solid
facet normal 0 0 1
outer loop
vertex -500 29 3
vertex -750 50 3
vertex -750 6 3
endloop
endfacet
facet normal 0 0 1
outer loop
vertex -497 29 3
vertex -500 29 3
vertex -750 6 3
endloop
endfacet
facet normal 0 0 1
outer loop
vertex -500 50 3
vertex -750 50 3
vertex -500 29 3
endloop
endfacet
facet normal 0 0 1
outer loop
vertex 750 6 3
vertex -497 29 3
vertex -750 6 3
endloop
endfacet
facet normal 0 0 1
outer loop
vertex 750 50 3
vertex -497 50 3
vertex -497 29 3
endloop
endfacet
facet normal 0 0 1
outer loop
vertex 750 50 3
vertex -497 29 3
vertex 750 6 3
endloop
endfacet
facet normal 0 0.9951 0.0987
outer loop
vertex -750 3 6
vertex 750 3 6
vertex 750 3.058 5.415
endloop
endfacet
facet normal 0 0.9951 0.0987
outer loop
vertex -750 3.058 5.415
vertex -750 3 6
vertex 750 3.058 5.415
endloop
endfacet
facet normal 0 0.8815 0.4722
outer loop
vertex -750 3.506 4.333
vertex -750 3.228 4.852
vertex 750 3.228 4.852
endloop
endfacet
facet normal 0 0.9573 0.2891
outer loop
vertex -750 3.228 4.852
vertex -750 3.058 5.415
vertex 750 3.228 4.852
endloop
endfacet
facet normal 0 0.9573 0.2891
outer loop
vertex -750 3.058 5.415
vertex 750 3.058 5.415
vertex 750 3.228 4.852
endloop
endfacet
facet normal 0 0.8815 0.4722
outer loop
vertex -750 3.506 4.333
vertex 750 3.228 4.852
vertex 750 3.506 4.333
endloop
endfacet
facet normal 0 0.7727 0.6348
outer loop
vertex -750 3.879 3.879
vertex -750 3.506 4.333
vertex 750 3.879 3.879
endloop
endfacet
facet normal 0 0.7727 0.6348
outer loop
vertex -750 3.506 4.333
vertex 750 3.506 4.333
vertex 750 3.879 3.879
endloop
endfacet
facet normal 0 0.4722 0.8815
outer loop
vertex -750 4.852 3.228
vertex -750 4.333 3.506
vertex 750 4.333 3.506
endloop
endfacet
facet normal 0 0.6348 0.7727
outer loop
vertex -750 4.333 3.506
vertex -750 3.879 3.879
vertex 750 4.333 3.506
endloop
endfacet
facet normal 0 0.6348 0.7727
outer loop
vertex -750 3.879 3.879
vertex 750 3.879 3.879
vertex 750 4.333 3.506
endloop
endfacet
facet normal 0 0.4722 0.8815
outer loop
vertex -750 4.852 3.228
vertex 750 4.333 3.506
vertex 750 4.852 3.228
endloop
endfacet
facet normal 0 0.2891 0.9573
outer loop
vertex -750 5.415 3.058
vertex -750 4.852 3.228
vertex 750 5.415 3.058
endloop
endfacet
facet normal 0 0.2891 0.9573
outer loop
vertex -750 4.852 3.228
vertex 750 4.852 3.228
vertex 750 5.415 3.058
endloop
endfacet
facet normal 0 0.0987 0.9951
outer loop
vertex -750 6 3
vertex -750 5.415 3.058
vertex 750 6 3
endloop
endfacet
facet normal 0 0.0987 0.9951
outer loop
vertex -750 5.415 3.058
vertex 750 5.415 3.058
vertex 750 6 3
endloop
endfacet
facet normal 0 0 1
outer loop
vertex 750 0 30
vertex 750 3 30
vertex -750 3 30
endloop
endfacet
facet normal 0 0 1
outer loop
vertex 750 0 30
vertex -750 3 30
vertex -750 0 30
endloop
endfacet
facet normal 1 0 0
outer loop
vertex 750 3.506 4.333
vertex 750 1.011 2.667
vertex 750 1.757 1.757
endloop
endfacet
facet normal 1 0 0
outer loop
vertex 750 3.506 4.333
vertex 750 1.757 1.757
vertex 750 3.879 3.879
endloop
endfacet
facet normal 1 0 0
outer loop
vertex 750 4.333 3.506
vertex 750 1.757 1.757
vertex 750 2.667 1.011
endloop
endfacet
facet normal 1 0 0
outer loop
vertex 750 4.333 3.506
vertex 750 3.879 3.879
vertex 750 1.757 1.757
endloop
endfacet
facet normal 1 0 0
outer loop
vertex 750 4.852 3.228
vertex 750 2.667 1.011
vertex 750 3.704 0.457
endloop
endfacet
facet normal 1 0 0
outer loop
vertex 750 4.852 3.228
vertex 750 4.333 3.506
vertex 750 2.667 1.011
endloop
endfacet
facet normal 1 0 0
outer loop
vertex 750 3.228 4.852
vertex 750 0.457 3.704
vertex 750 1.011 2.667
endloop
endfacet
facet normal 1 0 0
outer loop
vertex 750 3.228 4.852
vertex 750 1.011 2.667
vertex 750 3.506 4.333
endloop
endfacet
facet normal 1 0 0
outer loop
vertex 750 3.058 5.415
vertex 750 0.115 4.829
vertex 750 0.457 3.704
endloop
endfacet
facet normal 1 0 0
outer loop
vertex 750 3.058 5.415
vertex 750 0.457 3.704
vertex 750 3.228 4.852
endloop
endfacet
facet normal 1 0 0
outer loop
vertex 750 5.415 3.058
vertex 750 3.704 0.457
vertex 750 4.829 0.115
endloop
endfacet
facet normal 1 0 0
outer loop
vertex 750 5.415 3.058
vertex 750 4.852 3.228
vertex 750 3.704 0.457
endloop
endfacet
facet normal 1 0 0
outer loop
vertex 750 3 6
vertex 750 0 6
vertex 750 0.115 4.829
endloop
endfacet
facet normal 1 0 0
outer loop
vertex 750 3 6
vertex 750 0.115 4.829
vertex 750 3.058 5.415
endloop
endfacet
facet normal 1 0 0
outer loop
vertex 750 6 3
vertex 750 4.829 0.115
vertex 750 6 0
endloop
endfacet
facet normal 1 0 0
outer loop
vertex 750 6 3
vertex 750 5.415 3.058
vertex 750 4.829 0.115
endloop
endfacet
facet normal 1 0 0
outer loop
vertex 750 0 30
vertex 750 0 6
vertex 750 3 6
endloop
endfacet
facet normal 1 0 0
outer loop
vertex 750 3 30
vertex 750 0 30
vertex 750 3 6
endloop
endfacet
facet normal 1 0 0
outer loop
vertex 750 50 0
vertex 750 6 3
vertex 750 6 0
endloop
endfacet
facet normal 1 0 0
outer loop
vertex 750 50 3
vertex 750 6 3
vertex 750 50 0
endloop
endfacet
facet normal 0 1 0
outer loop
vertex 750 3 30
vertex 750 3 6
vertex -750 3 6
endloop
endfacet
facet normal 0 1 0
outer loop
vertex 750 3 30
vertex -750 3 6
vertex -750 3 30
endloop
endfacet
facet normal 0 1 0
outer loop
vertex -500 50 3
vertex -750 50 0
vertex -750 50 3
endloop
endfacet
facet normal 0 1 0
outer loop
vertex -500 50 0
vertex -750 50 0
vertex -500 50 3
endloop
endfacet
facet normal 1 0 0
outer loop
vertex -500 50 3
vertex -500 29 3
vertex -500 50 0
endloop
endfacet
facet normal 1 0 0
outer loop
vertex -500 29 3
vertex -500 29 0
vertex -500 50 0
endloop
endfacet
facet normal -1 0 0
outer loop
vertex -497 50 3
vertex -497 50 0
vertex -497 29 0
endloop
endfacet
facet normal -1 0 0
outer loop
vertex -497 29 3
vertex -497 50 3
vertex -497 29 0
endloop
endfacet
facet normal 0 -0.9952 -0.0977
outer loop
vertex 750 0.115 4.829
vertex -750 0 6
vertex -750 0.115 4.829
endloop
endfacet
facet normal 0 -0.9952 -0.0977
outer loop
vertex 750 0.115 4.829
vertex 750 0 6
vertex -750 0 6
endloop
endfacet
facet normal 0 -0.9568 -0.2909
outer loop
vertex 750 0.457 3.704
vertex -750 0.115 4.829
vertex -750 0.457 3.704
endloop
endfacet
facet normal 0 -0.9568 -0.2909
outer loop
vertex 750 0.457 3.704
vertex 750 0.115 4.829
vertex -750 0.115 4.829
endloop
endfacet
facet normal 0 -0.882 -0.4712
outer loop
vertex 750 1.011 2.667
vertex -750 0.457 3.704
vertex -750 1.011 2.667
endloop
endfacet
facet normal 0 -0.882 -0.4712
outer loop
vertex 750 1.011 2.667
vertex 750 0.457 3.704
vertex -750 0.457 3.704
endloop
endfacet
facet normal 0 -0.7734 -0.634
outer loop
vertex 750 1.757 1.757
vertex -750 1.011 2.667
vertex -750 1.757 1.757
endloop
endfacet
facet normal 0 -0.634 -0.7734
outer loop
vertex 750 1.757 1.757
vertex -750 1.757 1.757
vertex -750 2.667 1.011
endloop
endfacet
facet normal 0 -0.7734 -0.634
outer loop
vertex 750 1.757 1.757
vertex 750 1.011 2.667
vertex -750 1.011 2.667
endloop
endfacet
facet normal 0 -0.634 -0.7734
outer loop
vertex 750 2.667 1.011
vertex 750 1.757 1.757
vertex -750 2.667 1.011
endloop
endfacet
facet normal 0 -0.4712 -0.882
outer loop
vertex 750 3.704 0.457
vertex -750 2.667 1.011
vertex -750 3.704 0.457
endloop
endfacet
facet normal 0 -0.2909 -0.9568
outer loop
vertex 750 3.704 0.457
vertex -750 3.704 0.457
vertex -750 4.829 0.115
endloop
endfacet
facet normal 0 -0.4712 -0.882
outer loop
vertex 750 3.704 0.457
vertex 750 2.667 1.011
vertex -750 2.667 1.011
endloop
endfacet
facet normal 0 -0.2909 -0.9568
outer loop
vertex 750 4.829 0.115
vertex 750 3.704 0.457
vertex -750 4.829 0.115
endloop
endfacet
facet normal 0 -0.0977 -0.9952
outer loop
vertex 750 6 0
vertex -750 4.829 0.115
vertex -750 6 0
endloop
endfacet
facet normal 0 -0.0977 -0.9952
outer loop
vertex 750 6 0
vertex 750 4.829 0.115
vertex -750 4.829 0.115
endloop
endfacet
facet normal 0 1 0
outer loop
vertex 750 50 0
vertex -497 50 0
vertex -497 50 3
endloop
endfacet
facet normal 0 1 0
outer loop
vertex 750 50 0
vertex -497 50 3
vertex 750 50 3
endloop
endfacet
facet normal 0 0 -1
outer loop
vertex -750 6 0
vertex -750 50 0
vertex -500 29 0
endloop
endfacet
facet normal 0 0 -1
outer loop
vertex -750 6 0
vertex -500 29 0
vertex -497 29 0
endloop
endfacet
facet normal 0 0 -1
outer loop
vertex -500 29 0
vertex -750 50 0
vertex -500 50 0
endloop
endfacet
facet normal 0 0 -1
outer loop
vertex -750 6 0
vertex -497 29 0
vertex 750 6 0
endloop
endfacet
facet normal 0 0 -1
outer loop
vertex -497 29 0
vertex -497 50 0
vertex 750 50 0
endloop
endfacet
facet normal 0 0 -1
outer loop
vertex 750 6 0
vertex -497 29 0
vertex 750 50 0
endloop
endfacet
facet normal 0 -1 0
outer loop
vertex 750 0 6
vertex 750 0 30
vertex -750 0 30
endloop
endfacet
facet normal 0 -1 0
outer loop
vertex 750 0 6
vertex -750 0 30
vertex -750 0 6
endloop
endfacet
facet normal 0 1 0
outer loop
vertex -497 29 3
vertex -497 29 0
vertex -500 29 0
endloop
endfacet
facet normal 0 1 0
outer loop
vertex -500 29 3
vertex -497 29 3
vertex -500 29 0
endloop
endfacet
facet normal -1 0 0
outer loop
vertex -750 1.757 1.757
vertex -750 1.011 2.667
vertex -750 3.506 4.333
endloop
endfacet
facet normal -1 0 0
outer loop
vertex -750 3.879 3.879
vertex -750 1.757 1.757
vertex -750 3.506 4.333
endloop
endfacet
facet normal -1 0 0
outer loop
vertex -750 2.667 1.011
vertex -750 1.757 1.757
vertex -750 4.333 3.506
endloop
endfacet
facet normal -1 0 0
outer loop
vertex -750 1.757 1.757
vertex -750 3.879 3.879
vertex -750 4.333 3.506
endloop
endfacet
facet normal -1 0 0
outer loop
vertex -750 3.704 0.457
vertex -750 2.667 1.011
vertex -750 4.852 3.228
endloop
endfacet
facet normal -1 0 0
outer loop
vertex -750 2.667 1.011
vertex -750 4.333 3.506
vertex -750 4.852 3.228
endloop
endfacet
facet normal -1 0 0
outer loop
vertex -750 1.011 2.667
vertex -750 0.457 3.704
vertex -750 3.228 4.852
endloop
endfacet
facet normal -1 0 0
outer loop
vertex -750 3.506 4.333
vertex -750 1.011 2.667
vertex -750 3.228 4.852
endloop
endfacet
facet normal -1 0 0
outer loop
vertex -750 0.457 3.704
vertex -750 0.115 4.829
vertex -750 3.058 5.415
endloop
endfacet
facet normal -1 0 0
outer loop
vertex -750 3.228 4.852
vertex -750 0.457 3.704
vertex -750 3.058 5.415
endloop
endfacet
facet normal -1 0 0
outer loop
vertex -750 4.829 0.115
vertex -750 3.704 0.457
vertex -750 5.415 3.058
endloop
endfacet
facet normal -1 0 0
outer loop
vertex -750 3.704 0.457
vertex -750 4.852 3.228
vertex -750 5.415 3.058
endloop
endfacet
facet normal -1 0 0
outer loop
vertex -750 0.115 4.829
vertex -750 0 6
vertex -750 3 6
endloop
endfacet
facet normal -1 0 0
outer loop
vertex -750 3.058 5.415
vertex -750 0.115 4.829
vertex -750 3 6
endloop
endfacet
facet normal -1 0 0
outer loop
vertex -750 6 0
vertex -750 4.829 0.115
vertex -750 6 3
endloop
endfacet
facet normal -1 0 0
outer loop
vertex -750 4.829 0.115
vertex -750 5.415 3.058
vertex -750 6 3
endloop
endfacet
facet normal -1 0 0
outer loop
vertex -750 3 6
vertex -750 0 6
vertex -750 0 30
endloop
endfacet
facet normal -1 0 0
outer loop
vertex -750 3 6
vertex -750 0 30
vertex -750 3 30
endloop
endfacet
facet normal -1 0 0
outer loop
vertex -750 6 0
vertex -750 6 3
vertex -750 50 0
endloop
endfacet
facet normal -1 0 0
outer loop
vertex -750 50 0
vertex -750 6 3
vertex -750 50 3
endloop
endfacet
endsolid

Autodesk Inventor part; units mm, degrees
ref_plane "YZ Plane" through (0, 0, 0) normal (1, 0, 0) x (0, 1, 0)
ref_plane "XZ Plane" through (0, 0, 0) normal (0, 1, 0) x (-1, 0, 0)
ref_plane "XY Plane" through (0, 0, 0) normal (0, 0, 1) x (1, 0, 0)
sketch "Sketch1" plane through (0, 0, 0) normal (0, 0, 1) x (1, 0, 0)
  line L0 (-750, 50) -> (750, 50)
  line L1 (750, 50) -> (750, 0)
  line L2 (750, 0) -> (-750, 0)
  line L3 (-750, 0) -> (-750, 50)
  point P0 (0, 0)
  point P1 (0, 0)
  dimension "d0" = 1500
  dimension "d1" = 50
extrude "Plate1" add sketch "Sketch1" along normal blind 3
sketch "Sketch2" plane through (750, 3, 0) normal (0, -1, 0) x (1, 0, 0)
  line L0 (-1500, 0) -> (0, 0)
  line L1 (0, 0) -> (0, 30)
  line L2 (0, 30) -> (-1500, 30)
  line L3 (-1500, 30) -> (-1500, 0)
edge flange "Flange1" height 30 angle 90 thickness 3 bend radius 3 thickness toward (0, -1, 0) relief tear relief width 3 relief depth 1.5 edges at (0, 0, 3) wall of the first edge with corners at (-750, 3, 0) (750, 3, 0) (750, 3, 30) (-750, 3, 30)
bend "Bend1"
corner "Corner1"
sketch "Sketch5" plane through (0, 0, 0) normal (0, 0, -1) x (-1, 0, 0)
  line L0 (750, 50) -> (-750, 50) projected
  line L1 (497, 50) -> (497, 29)
  line L2 (497, 29) -> (500, 29)
  line L3 (500, 29) -> (500, 50)
  point P0 (0, 0)
  dimension "d17" = 21
  dimension "d18" = 3
  dimension "d19" = 250
extrude "Extrusion1" cut sketch "Sketch5" against normal through all
equation "\"d18\" = Thickness"
equation "\"d2\" = Thickness"
equation "\"d3\" = BendReliefWidth"
equation "\"d4\" = BendReliefDepth"
equation "\"d5\" = MinimumRemnant"
equation "\"d6\" = TransitionRadius"
equation "\"d9\" = BendRadius"
equation "\"d10\" = CornerReliefSize"
equation "\"d11\" = GapSize"
equation "\"d12\" = JacobiRadiusSize"
equation "\"BendRadius\" = Thickness"
equation "\"BendReliefWidth\" = Thickness"
equation "\"BendReliefDepth\" = 0.5 * Thickness"
equation "\"CornerReliefSize\" = 4 * Thickness"
equation "\"MinimumRemnant\" = 2 * Thickness"
equation "\"TransitionRadius\" = BendRadius"
equation "\"JacobiRadiusSize\" = BendRadius"
equation "\"GapSize\" = Thickness"
equation "\"Thickness\" = 3"
properties part number "МОО 050 стрингер спина 1"
